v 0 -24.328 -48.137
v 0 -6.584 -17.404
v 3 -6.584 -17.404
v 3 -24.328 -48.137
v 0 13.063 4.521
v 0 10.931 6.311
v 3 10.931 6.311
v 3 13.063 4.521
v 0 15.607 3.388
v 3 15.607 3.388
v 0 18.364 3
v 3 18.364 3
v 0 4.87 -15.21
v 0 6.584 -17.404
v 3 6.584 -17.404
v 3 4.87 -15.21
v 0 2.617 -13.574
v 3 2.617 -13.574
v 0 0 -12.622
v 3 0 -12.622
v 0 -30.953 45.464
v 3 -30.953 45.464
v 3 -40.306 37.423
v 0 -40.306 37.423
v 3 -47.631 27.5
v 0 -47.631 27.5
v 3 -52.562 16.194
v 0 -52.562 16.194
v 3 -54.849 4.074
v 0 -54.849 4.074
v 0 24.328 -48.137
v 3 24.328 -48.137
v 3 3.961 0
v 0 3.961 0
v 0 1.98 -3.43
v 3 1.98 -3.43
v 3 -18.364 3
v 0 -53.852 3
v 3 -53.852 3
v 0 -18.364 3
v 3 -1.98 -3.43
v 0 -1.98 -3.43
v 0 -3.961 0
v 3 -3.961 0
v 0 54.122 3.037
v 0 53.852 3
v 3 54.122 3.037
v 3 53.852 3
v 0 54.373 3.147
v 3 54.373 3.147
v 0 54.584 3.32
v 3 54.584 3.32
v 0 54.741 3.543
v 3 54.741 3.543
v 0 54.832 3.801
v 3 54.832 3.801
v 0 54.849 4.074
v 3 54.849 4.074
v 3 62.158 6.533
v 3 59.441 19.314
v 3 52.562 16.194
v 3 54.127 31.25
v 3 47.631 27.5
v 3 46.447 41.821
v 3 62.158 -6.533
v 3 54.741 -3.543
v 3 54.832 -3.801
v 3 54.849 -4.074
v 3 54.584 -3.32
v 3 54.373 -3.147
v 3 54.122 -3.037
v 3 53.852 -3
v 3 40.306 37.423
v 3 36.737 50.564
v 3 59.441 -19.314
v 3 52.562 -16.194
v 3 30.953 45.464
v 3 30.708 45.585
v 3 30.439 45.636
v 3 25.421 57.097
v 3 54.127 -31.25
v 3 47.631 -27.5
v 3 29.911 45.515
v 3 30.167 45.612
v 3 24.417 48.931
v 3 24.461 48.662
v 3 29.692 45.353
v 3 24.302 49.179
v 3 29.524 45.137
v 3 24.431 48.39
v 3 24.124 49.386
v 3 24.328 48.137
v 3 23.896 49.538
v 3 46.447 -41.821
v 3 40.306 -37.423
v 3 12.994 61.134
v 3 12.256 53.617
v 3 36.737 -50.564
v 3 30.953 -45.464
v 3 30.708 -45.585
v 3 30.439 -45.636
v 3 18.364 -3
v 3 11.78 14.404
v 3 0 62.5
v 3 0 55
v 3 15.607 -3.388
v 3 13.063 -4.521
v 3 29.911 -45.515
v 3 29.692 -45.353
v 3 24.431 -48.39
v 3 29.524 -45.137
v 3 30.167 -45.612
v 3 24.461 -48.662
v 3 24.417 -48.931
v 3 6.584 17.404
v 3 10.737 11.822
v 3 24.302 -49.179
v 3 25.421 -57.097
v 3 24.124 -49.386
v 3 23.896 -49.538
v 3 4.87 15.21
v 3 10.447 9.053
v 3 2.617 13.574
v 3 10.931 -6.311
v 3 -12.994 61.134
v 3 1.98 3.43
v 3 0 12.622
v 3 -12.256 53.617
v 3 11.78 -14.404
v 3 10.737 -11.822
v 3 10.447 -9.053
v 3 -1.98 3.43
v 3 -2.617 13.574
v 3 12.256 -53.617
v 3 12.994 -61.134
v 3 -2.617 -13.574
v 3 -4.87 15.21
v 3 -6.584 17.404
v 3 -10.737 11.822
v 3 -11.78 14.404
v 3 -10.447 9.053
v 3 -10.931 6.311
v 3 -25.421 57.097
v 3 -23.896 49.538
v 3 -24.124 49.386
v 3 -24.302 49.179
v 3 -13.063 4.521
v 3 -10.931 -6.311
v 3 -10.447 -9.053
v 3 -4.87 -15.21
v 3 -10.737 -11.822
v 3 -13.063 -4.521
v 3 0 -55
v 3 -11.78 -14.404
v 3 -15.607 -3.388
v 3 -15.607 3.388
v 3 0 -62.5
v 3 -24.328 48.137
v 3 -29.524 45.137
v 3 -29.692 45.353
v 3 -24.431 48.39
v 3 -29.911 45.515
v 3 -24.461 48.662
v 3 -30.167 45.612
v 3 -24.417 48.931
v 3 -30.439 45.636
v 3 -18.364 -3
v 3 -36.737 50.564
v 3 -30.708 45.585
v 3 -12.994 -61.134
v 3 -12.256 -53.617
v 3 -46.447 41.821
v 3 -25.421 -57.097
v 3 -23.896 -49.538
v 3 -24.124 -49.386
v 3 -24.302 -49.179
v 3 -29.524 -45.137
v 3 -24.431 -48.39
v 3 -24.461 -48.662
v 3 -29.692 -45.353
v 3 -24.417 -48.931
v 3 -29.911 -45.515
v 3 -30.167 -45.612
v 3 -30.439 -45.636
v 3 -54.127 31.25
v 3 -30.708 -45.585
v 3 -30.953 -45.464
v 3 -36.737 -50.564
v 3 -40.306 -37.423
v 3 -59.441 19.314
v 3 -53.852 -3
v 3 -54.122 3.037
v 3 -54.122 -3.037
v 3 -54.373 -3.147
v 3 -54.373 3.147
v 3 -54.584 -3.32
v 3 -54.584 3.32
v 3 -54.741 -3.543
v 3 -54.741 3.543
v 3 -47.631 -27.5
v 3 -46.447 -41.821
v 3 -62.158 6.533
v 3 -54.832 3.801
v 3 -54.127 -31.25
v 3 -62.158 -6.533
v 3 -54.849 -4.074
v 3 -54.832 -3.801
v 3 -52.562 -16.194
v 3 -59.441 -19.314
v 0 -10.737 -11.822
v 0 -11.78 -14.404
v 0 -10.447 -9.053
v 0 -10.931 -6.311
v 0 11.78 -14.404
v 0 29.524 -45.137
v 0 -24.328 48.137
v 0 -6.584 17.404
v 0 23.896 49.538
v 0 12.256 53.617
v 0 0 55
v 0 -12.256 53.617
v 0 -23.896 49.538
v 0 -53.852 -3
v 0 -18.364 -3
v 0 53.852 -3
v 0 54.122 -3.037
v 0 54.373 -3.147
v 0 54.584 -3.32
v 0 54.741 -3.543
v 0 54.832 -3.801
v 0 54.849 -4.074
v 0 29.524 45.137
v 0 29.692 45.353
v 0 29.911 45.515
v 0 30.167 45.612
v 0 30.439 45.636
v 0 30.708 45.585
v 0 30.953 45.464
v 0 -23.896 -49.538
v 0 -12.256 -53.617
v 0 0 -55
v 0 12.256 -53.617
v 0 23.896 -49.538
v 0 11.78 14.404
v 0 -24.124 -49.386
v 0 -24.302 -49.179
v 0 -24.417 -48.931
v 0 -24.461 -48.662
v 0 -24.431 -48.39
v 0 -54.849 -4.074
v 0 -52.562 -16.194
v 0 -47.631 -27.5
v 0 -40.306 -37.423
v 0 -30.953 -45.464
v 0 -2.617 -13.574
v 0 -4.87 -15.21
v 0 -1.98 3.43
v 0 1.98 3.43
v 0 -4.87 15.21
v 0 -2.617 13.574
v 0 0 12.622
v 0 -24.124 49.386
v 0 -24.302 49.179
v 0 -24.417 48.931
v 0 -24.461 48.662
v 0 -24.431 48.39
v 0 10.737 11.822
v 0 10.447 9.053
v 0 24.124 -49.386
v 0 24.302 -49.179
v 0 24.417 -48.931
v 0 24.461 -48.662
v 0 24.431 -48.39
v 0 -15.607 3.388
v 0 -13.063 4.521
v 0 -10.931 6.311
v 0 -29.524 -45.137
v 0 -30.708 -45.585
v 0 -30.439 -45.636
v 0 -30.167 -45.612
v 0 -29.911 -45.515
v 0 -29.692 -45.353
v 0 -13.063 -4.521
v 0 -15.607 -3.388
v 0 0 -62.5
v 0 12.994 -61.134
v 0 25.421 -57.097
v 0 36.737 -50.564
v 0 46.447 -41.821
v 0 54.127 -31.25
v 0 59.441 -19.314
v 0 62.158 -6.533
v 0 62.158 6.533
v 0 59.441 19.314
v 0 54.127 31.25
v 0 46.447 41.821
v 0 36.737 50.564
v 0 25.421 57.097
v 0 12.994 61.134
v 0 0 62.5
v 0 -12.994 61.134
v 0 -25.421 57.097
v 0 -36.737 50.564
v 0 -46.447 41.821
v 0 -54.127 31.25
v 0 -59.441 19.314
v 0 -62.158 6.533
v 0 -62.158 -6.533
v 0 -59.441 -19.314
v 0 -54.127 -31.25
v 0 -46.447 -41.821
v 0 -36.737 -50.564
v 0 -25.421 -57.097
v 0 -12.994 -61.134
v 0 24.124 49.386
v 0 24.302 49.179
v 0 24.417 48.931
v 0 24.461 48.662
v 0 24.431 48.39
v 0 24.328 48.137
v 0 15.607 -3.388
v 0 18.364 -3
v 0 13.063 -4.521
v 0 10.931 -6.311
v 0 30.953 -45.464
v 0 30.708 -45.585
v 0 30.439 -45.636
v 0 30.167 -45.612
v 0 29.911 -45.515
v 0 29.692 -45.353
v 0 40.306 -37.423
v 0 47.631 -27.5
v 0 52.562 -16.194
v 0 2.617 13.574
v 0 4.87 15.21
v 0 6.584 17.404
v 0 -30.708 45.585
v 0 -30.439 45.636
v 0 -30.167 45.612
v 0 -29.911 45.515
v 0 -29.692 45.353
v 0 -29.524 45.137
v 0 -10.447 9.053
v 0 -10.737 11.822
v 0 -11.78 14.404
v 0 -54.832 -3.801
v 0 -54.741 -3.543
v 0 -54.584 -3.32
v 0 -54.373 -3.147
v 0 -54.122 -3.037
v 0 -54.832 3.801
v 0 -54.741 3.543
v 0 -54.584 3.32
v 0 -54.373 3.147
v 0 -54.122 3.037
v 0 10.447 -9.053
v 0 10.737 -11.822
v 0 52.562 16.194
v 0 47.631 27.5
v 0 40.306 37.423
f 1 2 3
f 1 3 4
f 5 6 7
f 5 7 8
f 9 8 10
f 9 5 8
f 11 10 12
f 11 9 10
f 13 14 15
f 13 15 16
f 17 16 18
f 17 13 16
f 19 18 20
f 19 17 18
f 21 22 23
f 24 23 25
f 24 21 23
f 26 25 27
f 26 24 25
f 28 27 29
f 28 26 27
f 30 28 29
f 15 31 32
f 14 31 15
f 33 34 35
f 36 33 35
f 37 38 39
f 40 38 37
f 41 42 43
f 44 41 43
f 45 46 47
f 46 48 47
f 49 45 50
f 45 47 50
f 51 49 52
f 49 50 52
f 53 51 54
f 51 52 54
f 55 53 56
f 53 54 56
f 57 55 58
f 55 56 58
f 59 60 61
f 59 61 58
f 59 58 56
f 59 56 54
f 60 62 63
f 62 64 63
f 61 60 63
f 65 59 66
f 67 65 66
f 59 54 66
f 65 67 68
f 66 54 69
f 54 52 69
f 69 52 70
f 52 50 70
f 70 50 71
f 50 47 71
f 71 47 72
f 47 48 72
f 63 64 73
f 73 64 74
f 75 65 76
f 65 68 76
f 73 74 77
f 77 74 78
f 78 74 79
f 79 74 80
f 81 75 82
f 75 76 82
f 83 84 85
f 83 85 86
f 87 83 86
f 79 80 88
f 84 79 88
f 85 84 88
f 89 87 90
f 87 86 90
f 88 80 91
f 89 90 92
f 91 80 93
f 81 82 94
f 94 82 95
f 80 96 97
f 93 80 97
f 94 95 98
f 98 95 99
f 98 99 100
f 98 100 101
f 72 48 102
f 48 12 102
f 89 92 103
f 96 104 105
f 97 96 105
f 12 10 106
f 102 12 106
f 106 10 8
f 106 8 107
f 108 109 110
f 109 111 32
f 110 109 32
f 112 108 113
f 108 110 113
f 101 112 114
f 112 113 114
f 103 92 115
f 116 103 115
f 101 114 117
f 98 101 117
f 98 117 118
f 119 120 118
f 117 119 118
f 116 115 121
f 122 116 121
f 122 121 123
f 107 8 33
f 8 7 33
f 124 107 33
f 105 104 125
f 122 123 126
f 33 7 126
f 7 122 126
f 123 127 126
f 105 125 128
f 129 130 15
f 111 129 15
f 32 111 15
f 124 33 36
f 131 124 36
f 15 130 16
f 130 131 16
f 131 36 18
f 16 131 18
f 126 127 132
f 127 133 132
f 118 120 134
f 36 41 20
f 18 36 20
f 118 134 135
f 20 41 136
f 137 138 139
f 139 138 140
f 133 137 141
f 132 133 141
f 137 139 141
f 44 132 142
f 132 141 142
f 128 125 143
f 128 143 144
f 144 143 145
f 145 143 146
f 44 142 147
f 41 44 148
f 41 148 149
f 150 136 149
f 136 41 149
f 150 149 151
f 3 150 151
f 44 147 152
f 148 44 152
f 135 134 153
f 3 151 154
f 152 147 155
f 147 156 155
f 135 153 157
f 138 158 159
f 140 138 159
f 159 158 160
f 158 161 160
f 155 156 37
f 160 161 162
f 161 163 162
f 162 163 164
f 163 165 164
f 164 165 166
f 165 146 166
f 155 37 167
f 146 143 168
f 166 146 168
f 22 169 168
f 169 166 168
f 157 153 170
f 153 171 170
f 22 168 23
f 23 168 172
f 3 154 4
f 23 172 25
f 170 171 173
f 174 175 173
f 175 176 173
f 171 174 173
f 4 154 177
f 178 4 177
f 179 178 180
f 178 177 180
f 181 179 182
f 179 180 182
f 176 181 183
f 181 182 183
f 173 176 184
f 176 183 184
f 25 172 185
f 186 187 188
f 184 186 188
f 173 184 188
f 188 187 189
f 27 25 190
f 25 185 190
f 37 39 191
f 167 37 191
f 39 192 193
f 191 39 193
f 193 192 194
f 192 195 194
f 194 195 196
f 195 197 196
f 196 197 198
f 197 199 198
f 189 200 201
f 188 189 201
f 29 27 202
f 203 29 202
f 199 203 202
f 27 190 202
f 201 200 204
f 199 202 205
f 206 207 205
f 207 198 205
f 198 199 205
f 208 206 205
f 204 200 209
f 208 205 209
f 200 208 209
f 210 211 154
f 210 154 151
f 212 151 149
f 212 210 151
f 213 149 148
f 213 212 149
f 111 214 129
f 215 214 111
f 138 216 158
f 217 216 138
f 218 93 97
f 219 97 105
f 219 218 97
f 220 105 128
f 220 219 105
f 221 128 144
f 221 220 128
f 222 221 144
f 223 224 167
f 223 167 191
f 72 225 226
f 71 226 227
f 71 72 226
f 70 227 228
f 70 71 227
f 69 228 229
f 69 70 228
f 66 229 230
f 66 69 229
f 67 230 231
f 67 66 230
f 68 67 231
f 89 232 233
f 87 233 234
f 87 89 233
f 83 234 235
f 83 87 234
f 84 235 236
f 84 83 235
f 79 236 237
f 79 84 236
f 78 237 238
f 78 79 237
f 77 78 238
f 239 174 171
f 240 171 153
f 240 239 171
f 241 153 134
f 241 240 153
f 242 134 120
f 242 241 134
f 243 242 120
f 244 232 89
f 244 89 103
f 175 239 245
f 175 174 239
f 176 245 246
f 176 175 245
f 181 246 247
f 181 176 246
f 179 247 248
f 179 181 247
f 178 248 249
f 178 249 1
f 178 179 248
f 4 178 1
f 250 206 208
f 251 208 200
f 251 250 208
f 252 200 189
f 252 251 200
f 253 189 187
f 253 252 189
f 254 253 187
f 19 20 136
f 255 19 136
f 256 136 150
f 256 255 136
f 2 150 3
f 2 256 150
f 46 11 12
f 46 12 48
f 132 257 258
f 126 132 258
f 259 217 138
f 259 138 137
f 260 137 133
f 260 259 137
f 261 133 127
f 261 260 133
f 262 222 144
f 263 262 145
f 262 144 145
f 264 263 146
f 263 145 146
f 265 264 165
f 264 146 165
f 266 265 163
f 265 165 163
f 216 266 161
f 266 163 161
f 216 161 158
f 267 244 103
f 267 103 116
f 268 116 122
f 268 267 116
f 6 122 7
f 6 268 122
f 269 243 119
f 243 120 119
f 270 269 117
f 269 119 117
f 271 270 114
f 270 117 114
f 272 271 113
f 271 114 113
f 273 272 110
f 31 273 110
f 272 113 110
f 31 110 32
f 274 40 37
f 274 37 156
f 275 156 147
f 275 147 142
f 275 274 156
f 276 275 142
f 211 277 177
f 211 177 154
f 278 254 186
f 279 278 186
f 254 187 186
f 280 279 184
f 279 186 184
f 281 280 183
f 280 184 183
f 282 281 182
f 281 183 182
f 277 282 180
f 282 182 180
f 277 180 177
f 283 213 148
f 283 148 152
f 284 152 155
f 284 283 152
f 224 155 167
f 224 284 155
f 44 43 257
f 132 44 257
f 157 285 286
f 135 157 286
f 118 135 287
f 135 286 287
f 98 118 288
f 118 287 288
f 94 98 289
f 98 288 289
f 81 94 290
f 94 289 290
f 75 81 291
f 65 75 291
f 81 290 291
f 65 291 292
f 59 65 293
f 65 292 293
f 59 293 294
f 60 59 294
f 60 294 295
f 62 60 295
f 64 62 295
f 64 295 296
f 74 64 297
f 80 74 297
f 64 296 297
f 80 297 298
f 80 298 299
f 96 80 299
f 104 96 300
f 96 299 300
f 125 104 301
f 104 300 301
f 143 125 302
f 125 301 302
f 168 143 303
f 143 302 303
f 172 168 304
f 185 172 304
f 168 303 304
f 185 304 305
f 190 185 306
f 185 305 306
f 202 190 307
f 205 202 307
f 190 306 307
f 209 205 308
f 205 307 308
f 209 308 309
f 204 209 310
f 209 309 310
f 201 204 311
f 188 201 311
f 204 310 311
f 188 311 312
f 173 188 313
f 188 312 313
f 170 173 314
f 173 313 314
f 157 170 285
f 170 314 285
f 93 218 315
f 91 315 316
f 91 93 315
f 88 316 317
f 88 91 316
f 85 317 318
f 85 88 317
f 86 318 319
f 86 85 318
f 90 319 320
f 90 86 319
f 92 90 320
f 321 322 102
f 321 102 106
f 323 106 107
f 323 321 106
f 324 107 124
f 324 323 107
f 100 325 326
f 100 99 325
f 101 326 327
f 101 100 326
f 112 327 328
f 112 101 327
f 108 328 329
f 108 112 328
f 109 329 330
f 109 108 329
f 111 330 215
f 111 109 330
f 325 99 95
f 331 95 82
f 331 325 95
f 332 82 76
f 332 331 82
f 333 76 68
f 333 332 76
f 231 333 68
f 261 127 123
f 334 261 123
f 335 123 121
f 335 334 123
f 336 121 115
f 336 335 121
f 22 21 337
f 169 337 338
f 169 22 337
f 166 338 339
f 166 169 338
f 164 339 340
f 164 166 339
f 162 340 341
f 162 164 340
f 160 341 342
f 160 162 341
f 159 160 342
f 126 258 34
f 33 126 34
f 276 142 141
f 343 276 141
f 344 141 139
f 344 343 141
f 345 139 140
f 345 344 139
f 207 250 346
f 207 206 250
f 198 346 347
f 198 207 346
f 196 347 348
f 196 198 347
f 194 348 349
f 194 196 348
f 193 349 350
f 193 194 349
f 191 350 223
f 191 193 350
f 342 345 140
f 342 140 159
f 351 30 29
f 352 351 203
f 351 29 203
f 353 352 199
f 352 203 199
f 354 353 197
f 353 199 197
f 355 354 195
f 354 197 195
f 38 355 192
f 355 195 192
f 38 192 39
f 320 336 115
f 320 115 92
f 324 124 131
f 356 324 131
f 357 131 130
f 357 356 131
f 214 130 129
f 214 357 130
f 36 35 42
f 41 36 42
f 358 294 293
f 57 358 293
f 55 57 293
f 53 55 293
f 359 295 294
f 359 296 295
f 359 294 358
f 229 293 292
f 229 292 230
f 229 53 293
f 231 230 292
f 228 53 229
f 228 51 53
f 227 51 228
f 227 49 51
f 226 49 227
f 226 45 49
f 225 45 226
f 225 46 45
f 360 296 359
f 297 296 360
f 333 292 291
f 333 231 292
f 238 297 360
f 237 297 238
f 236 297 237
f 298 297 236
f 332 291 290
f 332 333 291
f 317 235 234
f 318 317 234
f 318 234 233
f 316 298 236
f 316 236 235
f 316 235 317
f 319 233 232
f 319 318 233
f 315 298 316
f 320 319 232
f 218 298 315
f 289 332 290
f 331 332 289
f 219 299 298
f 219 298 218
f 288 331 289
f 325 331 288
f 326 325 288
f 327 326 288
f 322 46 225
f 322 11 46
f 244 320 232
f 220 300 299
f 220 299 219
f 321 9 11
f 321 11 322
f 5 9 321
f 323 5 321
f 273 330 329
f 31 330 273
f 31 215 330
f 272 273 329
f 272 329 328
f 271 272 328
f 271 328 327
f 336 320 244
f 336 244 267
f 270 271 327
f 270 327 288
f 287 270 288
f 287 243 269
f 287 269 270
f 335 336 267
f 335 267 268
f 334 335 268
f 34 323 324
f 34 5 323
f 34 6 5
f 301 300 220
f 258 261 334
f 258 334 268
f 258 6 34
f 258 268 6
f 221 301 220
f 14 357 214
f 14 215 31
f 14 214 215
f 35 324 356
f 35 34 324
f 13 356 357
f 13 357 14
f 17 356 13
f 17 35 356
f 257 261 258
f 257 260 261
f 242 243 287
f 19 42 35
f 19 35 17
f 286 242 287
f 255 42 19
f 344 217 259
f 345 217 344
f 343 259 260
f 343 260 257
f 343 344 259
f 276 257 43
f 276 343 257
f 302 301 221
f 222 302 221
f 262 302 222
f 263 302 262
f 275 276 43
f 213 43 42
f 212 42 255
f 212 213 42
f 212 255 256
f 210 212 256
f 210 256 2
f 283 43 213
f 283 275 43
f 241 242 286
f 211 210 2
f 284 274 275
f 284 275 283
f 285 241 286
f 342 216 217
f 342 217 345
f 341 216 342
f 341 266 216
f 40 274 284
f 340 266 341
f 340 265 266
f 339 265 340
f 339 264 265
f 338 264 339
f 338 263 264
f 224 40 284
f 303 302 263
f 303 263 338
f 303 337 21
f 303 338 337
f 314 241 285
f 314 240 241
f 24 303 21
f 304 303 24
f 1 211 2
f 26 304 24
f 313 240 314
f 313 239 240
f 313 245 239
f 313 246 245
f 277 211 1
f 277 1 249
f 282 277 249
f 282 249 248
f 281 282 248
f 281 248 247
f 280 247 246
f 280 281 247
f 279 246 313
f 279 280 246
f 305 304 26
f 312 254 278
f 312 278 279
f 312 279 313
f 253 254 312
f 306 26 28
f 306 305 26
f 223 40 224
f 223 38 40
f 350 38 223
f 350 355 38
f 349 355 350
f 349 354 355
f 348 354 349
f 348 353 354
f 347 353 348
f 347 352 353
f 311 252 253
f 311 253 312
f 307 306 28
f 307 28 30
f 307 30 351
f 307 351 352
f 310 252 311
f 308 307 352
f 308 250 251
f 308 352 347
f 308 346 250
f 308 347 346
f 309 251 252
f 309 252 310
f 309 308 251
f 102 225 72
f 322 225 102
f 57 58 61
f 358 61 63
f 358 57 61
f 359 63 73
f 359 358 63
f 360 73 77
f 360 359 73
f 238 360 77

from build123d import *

# Parameters (mm, degrees)
SKETCH1_R           = 62.5
BOSS_EXTRUDE1_DEPTH = 3
CUT_EXTRUDE5_DEPTH  = 89.439244682
CIRPATTERN4_COUNT   = 6
CUT_EXTRUDE6_DEPTH  = 89.439244682
FILLET1_R           = 10
FILLET2_R           = 1


with BuildPart() as part:
    # Sketch1 → Boss-Extrude1 (new body)
    with BuildSketch(Plane(origin=(0, 0, 0), x_dir=(0, 0, -1), z_dir=(1, 0, 0))):
        Circle(SKETCH1_R)
    extrude(amount=BOSS_EXTRUDE1_DEPTH)

    # Sketch6 → Cut-Extrude5 (cut, through all)
    with BuildSketch(Plane.ZY):
        with BuildLine():
            Line((-3, 54.918120871), (-3, 12.1346611))
            ThreePointArc((-3, 12.1346611), (-6.25, 10.825317547), (-9.008924778, 8.665406761))
            Line((-9.008924778, 8.665406761), (-46.060487802, 30.057136647))
            ThreePointArc((-46.060487802, 30.057136647), (-27.5, 47.631397208), (-3, 54.918120871))
        make_face()
    cut_extrude5 = extrude(amount=-CUT_EXTRUDE5_DEPTH, mode=Mode.SUBTRACT)

    # CirPattern4: Cut-Extrude5 ×6 about axis
    cirpattern4_axis = Axis((0, 0, 0), (1, 0, 0))
    for i in range(1, CIRPATTERN4_COUNT):
        add(cut_extrude5.rotate(cirpattern4_axis, i * 360 / CIRPATTERN4_COUNT), mode=Mode.SUBTRACT)

    # Sketch7 → Cut-Extrude6 (cut, through all)
    with BuildSketch(Plane.ZY):
        Polygon((0, 3.960622847), (-3.43, 1.980311423), (-3.43, -1.980311423), (0, -3.960622847), (3.43, -1.980311423), (3.43, 1.980311423), align=None)
    extrude(amount=-CUT_EXTRUDE6_DEPTH, mode=Mode.SUBTRACT)

    # Fillet1
    # the kernel refuses this fillet: 10 mm, written as the material it adds along each edge
    with BuildSketch(Plane(origin=(0, 12.1346611, 3), x_dir=(0, 1, 0), z_dir=(1, 0, 0)), Plane(origin=(0, 3.469254338, 12.008924778), x_dir=(0, 0.5000000000000027, 0.8660254037844372), z_dir=(1, 0, 0)), Plane(origin=(0, -8.665406761, 9.008924778), x_dir=(0, -0.4999999999999975, 0.8660254037844402), z_dir=(1, 0, 0)), Plane(origin=(0, -12.1346611, -3), x_dir=(0, -1, 0), z_dir=(1, 0, 0)), Plane(origin=(0, -3.469254338, -12.008924778), x_dir=(0, -0.500000000000002, -0.8660254037844375), z_dir=(1, 0, 0)), Plane(origin=(0, 8.665406761, -9.008924778), x_dir=(0, 0.4999999999999975, -0.86602540378444), z_dir=(1, 0, 0))) as fillet1_piece_1:
        with BuildLine():
            CenterArc((6.229706573, 10), FILLET1_R, 215.294394677, 54.705605323)
            ThreePointArc((-1.932234615, 4.222222222), (-0.768344169, 2.201618925), (0, 0))
            Line((0, 0), (6.229706573, 0))
        make_face()
    extrude(amount=3)
    with BuildSketch(Plane(origin=(0, 8.665406761, 9.008924778), x_dir=(0, 0.5000000000000008, 0.8660254037844382), z_dir=(1, 0, 0)), Plane(origin=(0, -3.469254338, 12.008924778), x_dir=(0, -0.49999999999999983, 0.8660254037844387), z_dir=(1, 0, 0)), Plane(origin=(0, -12.1346611, 3), x_dir=(0, -1, 0), z_dir=(1, 0, 0)), Plane(origin=(0, -8.665406761, -9.008924778), x_dir=(0, -0.5000000000000001, -0.8660254037844385), z_dir=(1, 0, 0)), Plane(origin=(0, 3.469254338, -12.008924778), x_dir=(0, 0.5000000000000001, -0.8660254037844385), z_dir=(1, 0, 0)), Plane(origin=(0, 12.1346611, -3), x_dir=(0, 1, 0), z_dir=(1, 0, 0))) as fillet1_piece_2:
        with BuildLine():
            CenterArc((6.229706573, -10), FILLET1_R, 90, 54.705605323)
            ThreePointArc((-1.932234615, -4.222222222), (-0.768344169, -2.201618925), (0, 0))
            Line((0, 0), (6.229706573, 0))
        make_face()
    extrude(amount=3)

    # Fillet2
    fillet2_edges = [part.edges().sort_by_distance(p)[0] for p in [
        (1.5, 54.918120871, -3),
        (1.5, -54.918120871, -3),
        (1.5, -30.057136647, -46.060487802),
        (1.5, -30.057136647, 46.060487802),
        (1.5, -54.918120871, 3),
        (1.5, 54.918120871, 3),
        (1.5, 30.057136647, 46.060487802),
        (1.5, 24.860984224, 49.060487802),
        (1.5, -24.860984224, 49.060487802),
        (1.5, -24.860984224, -49.060487802),
        (1.5, 24.860984224, -49.060487802),
        (1.5, 30.057136647, -46.060487802),
    ]]
    fillet(fillet2_edges, radius=FILLET2_R)


solid = part.part
